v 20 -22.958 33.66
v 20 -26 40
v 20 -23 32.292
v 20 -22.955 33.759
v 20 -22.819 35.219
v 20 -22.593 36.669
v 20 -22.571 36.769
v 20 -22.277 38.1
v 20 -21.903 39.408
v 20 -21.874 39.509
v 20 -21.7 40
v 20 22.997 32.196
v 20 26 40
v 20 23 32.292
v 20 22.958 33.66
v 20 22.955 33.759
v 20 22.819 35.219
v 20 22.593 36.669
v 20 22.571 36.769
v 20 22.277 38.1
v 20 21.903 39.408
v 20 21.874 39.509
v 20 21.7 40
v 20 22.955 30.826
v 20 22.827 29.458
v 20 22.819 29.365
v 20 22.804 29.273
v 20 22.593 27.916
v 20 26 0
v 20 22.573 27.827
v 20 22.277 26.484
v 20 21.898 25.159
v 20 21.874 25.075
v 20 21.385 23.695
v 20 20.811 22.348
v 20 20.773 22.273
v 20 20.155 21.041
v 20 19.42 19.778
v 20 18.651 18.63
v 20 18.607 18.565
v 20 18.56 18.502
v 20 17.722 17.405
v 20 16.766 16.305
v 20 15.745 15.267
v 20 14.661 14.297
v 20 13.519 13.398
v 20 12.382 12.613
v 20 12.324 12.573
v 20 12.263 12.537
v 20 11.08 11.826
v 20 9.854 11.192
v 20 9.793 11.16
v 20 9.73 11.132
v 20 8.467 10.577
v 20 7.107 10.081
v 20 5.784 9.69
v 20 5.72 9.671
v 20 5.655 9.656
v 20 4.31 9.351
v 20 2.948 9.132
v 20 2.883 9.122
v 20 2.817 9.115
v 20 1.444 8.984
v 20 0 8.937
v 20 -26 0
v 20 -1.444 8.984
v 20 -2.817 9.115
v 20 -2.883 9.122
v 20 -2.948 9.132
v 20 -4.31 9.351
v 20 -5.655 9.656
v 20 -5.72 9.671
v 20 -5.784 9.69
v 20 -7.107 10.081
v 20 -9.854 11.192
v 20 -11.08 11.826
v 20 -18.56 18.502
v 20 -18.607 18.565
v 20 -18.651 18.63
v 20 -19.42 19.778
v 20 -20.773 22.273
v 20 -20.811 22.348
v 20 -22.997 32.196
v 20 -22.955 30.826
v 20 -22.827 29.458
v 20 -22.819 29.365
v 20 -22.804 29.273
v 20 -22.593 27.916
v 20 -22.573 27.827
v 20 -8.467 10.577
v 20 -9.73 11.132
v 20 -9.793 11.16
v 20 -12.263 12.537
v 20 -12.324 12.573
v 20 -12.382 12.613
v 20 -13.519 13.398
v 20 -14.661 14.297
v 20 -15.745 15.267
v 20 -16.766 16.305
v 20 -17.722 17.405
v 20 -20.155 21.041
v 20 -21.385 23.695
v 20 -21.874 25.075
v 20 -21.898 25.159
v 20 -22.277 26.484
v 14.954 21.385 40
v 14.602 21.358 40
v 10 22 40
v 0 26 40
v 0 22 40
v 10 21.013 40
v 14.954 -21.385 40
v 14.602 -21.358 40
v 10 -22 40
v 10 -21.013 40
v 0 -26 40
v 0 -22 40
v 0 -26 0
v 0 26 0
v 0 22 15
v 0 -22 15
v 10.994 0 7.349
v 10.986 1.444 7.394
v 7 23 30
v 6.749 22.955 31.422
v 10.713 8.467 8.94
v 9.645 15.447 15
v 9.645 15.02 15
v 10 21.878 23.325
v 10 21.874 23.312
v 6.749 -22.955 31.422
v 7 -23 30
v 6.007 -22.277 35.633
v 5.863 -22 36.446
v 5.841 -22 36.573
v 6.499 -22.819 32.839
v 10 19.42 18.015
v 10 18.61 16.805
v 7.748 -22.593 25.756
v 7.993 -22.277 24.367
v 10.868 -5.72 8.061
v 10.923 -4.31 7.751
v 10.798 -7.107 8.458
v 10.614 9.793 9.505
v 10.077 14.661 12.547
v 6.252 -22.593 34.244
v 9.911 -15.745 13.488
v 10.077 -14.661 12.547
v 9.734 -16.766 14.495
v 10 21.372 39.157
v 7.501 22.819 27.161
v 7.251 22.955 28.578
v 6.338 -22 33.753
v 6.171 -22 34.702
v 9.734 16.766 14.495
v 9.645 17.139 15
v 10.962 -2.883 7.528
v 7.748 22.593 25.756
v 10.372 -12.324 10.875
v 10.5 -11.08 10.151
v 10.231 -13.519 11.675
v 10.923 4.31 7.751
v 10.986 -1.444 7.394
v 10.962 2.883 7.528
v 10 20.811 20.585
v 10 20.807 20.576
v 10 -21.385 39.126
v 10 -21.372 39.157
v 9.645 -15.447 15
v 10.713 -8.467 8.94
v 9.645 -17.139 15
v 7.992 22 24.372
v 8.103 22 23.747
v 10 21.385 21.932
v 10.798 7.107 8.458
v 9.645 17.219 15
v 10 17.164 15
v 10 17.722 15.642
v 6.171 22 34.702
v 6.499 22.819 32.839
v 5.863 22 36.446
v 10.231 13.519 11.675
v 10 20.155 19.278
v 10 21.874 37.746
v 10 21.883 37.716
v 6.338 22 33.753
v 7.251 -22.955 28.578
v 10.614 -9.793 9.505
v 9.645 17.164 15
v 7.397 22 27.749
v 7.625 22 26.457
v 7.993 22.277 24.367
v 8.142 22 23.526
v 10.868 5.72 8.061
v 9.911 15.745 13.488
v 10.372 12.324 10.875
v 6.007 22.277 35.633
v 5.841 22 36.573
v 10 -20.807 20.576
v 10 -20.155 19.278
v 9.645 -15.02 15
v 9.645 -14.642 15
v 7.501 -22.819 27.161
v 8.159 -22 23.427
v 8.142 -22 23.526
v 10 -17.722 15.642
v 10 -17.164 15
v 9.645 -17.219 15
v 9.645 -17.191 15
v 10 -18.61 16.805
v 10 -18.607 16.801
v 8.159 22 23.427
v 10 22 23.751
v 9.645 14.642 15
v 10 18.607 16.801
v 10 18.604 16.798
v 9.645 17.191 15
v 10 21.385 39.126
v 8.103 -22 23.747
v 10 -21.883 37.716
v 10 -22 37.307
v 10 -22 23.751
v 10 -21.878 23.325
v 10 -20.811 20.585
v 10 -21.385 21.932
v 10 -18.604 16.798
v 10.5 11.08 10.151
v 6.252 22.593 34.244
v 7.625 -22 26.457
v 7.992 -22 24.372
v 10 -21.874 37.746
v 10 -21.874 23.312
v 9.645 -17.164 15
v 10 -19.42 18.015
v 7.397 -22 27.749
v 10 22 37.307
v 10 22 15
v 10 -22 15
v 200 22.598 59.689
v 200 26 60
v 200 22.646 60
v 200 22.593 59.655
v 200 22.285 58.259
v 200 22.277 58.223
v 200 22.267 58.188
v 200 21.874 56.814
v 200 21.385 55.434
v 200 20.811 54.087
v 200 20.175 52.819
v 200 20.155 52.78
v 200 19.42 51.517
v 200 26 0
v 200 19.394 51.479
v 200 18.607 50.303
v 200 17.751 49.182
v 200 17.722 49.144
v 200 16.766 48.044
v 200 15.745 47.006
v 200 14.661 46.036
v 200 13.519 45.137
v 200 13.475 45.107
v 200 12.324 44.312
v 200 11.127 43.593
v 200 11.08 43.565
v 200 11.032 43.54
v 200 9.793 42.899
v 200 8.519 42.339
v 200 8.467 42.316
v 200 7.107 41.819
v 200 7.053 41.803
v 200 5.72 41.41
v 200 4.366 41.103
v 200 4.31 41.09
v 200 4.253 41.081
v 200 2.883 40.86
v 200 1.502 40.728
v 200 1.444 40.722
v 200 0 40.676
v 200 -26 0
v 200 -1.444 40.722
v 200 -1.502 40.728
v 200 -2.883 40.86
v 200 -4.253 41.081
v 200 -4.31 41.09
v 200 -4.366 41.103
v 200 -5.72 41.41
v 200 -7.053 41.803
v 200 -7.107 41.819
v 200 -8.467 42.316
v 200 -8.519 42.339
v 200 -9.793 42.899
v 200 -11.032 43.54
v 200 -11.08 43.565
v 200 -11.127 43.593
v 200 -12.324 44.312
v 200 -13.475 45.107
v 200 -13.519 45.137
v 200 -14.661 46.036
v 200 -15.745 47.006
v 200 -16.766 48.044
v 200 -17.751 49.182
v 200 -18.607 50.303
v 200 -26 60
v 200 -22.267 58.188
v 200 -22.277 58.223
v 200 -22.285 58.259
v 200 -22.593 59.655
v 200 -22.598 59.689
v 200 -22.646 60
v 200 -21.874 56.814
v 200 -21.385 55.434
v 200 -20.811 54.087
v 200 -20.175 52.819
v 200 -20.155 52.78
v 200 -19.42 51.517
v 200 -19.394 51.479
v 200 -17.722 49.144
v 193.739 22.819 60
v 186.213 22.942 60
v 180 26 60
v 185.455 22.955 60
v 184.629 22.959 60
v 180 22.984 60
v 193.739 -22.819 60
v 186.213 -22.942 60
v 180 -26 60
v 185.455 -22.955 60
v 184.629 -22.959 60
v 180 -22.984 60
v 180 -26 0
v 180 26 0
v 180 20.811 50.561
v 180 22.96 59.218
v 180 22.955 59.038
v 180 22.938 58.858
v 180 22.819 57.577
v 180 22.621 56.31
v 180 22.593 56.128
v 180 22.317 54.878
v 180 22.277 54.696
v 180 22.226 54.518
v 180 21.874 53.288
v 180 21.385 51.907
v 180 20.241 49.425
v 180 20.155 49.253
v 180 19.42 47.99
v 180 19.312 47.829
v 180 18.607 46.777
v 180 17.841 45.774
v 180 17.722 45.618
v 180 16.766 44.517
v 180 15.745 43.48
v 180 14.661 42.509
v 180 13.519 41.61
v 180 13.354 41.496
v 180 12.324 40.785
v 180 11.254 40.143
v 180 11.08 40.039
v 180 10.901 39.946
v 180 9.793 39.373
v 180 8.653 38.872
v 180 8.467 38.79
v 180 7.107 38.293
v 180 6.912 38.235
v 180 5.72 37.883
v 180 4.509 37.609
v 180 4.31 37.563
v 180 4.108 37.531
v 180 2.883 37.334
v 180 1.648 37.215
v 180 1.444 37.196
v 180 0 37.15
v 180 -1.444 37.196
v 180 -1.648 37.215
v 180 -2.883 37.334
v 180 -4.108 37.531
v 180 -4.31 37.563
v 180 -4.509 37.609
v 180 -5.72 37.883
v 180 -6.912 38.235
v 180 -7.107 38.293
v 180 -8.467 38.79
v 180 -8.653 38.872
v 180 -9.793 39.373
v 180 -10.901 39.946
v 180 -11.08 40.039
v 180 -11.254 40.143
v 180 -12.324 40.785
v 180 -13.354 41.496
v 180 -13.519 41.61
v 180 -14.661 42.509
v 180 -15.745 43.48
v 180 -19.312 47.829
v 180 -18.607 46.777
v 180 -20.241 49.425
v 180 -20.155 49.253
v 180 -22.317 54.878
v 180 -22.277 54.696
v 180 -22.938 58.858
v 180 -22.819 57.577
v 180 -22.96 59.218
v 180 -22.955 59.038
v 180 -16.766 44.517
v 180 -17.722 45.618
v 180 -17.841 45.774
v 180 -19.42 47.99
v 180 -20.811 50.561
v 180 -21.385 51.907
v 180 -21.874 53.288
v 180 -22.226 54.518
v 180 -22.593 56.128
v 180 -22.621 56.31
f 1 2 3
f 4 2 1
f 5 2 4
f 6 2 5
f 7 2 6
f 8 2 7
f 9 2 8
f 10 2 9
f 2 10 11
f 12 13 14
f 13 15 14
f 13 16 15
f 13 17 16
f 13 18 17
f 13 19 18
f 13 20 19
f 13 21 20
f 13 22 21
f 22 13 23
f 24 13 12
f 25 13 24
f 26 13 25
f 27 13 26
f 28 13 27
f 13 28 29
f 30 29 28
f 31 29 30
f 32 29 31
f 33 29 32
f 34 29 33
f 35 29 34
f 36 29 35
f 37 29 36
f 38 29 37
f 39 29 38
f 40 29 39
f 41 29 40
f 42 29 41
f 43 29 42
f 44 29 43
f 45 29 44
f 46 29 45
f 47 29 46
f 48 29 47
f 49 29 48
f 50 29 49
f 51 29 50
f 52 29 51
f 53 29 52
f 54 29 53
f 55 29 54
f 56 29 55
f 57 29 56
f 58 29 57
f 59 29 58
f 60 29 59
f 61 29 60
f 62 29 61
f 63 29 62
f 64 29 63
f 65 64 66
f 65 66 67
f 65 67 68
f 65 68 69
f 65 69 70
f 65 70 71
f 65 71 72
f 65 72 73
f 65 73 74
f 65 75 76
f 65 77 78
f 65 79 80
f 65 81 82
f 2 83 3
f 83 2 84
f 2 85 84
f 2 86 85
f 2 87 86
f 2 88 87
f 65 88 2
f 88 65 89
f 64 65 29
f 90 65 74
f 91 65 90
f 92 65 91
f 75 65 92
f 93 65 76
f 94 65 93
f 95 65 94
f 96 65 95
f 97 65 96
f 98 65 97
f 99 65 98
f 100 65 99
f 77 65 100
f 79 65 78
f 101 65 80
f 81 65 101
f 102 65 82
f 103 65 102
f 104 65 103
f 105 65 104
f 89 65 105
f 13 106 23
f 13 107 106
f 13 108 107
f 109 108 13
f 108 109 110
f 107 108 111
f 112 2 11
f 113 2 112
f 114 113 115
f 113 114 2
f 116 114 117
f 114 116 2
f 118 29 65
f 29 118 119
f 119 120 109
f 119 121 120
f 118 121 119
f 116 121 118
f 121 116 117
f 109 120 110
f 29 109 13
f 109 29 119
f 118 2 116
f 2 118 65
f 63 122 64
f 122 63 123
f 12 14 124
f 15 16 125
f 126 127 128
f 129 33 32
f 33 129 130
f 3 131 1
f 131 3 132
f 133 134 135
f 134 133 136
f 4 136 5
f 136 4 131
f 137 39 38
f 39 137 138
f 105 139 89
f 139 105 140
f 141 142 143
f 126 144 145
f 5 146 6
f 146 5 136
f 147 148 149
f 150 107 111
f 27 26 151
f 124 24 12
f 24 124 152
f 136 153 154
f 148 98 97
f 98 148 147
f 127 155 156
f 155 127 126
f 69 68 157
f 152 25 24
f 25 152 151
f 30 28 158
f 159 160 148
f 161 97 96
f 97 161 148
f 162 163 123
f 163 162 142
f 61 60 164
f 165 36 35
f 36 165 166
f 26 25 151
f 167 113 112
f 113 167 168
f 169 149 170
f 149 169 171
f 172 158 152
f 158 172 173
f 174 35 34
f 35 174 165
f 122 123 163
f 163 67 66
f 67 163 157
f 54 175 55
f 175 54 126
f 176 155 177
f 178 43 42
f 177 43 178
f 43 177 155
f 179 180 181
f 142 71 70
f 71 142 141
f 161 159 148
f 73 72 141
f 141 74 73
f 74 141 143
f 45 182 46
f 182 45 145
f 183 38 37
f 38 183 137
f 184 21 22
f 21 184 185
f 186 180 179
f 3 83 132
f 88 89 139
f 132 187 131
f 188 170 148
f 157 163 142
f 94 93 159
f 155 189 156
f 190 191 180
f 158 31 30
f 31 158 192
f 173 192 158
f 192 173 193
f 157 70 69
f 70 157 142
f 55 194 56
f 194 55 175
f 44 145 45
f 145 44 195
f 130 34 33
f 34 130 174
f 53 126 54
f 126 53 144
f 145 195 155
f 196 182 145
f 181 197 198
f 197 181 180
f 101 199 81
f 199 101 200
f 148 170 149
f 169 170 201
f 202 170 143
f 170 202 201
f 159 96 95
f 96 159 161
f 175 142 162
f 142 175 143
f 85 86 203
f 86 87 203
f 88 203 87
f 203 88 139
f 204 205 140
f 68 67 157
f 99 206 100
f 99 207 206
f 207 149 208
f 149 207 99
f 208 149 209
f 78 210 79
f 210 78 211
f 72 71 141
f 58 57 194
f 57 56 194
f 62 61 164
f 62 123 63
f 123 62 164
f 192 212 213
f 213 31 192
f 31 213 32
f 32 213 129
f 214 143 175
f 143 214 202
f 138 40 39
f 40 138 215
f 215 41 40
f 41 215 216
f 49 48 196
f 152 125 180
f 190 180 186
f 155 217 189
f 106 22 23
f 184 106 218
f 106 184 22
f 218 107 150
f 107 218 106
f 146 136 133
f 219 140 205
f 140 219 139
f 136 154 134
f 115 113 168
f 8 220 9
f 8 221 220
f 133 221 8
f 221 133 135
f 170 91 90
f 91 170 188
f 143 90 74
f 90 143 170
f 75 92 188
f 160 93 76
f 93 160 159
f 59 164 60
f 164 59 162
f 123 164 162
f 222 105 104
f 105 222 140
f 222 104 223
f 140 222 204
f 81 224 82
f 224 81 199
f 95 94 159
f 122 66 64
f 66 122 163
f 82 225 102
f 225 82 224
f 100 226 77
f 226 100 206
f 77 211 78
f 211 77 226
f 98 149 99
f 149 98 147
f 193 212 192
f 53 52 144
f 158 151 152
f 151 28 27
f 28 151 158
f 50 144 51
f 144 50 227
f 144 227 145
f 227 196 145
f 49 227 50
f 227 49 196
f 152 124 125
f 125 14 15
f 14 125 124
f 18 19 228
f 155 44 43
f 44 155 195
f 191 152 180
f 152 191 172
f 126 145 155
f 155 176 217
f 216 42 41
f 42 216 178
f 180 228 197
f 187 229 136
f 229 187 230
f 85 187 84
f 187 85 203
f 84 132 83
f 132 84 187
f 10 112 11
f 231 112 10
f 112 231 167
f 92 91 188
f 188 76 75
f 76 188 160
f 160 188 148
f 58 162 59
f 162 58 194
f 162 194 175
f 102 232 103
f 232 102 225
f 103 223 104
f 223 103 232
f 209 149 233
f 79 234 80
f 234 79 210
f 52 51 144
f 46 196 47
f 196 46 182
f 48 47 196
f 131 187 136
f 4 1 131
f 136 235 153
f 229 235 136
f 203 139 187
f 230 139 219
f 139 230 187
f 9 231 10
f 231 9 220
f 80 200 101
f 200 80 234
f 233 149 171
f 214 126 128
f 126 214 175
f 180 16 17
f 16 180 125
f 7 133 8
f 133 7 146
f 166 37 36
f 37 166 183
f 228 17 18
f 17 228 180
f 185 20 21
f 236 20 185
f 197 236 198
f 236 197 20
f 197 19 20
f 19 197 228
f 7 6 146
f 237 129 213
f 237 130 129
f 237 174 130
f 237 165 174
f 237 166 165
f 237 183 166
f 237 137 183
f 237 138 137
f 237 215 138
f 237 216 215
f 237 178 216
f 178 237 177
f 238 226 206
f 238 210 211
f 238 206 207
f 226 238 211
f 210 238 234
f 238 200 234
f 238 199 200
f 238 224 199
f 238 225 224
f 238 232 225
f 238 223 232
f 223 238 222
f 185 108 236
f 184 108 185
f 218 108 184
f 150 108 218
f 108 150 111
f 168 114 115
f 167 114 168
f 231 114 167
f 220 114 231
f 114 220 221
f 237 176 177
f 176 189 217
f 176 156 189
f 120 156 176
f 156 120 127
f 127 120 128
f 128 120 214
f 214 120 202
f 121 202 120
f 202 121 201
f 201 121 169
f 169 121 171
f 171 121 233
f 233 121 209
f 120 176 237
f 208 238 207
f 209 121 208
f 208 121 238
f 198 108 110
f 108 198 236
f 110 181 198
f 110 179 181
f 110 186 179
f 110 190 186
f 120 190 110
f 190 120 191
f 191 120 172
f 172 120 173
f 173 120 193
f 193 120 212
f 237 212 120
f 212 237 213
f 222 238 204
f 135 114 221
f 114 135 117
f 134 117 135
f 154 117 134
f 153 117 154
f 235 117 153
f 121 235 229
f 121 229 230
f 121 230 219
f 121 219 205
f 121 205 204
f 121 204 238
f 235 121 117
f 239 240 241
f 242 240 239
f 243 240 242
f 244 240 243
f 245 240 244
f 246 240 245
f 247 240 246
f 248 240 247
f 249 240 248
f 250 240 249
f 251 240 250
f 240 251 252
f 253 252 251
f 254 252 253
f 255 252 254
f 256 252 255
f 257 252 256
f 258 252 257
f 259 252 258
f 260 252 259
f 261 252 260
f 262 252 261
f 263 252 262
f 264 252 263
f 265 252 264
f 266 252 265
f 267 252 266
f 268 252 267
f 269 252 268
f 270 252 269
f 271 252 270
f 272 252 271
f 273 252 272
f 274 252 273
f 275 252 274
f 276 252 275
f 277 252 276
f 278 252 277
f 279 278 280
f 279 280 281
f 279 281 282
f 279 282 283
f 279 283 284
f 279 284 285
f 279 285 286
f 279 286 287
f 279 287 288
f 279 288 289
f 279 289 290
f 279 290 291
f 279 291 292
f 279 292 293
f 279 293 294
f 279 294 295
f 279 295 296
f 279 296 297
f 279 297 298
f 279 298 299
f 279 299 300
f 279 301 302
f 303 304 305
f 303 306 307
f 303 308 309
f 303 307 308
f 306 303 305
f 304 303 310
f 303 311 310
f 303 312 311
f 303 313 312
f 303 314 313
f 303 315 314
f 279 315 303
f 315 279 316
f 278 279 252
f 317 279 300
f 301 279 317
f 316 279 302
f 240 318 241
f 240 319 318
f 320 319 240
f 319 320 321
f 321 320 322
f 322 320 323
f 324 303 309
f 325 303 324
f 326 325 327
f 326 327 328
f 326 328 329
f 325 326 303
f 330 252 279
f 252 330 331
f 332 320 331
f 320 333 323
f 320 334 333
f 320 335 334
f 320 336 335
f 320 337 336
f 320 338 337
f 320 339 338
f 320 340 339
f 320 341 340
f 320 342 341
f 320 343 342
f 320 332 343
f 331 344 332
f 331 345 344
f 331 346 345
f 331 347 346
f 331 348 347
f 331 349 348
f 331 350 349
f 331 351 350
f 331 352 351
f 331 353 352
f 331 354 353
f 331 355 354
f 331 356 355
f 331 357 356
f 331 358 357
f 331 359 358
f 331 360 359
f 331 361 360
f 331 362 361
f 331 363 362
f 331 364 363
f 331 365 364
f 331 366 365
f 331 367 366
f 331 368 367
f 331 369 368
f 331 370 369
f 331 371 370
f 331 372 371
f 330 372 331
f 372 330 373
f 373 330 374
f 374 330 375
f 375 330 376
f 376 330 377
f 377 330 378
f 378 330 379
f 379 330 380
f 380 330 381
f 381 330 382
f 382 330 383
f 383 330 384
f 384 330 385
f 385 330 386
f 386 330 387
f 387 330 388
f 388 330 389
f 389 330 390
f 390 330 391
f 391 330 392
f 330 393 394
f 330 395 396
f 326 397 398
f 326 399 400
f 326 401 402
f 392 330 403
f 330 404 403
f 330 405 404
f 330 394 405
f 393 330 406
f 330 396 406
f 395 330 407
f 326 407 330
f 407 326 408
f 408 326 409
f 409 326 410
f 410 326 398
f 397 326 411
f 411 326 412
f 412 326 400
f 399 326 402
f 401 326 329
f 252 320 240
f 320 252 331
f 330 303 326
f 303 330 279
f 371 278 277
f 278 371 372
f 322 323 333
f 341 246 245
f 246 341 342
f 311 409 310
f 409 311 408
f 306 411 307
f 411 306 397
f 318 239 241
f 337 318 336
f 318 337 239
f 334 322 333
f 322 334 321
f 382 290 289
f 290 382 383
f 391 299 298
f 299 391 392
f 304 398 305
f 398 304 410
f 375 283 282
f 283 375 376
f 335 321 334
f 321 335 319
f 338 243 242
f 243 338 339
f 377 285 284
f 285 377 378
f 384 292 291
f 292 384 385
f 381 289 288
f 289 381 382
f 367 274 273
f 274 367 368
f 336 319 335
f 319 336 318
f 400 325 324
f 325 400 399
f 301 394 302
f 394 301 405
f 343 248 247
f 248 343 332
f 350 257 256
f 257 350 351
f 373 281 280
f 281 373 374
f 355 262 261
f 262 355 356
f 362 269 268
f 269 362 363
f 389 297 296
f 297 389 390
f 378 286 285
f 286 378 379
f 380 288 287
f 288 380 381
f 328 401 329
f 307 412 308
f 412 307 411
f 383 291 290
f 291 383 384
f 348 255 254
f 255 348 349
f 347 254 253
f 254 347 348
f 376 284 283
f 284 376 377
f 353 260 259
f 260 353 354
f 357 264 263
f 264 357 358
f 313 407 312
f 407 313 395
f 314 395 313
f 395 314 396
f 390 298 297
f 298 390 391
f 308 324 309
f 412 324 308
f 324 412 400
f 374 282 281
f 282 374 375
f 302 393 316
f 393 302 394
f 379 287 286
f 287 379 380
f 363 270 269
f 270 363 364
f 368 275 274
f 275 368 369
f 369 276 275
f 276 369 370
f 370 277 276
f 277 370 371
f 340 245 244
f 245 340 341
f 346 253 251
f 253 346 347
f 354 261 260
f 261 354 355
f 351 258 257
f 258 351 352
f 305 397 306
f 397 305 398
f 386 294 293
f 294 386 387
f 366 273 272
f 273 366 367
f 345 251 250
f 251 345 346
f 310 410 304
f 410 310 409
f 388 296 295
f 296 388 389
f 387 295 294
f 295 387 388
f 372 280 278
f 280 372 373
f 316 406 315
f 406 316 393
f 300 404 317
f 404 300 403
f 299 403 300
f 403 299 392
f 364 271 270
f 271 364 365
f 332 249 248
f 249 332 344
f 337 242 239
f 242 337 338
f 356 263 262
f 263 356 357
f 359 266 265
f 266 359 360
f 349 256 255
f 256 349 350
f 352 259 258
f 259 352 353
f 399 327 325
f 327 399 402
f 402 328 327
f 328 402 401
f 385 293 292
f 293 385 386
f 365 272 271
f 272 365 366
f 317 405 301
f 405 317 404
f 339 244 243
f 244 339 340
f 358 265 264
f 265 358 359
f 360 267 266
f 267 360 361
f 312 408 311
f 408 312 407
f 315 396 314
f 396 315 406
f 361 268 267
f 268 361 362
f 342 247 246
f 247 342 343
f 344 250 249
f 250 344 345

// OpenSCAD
//Tube Stand
//Holds the tube at 10 degree angle up
$fn = 100;

//tube dimension
TubeDiameter = 44;
TubeLength = 200;

TubeHolder();


//Holder diemensions
holderL = 20;
holderW = TubeDiameter+8;
holderH = 40;

module TubeHolder(){
    difference(){
        translate([0,-holderW/2,0])cube([holderL,holderW,holderH]);
        tube();
        translate([0,0,40])cube([20,holderW-8,50],true);
    }
    difference(){
        translate([TubeLength-20,-holderW/2,0])cube([holderL,holderW,holderH+20]);
        tube();
    }
}

module tube(){
    translate([7,0,30])rotate([0,80,0])cylinder(d=TubeDiameter+2,h=TubeLength);//the Tube
}
